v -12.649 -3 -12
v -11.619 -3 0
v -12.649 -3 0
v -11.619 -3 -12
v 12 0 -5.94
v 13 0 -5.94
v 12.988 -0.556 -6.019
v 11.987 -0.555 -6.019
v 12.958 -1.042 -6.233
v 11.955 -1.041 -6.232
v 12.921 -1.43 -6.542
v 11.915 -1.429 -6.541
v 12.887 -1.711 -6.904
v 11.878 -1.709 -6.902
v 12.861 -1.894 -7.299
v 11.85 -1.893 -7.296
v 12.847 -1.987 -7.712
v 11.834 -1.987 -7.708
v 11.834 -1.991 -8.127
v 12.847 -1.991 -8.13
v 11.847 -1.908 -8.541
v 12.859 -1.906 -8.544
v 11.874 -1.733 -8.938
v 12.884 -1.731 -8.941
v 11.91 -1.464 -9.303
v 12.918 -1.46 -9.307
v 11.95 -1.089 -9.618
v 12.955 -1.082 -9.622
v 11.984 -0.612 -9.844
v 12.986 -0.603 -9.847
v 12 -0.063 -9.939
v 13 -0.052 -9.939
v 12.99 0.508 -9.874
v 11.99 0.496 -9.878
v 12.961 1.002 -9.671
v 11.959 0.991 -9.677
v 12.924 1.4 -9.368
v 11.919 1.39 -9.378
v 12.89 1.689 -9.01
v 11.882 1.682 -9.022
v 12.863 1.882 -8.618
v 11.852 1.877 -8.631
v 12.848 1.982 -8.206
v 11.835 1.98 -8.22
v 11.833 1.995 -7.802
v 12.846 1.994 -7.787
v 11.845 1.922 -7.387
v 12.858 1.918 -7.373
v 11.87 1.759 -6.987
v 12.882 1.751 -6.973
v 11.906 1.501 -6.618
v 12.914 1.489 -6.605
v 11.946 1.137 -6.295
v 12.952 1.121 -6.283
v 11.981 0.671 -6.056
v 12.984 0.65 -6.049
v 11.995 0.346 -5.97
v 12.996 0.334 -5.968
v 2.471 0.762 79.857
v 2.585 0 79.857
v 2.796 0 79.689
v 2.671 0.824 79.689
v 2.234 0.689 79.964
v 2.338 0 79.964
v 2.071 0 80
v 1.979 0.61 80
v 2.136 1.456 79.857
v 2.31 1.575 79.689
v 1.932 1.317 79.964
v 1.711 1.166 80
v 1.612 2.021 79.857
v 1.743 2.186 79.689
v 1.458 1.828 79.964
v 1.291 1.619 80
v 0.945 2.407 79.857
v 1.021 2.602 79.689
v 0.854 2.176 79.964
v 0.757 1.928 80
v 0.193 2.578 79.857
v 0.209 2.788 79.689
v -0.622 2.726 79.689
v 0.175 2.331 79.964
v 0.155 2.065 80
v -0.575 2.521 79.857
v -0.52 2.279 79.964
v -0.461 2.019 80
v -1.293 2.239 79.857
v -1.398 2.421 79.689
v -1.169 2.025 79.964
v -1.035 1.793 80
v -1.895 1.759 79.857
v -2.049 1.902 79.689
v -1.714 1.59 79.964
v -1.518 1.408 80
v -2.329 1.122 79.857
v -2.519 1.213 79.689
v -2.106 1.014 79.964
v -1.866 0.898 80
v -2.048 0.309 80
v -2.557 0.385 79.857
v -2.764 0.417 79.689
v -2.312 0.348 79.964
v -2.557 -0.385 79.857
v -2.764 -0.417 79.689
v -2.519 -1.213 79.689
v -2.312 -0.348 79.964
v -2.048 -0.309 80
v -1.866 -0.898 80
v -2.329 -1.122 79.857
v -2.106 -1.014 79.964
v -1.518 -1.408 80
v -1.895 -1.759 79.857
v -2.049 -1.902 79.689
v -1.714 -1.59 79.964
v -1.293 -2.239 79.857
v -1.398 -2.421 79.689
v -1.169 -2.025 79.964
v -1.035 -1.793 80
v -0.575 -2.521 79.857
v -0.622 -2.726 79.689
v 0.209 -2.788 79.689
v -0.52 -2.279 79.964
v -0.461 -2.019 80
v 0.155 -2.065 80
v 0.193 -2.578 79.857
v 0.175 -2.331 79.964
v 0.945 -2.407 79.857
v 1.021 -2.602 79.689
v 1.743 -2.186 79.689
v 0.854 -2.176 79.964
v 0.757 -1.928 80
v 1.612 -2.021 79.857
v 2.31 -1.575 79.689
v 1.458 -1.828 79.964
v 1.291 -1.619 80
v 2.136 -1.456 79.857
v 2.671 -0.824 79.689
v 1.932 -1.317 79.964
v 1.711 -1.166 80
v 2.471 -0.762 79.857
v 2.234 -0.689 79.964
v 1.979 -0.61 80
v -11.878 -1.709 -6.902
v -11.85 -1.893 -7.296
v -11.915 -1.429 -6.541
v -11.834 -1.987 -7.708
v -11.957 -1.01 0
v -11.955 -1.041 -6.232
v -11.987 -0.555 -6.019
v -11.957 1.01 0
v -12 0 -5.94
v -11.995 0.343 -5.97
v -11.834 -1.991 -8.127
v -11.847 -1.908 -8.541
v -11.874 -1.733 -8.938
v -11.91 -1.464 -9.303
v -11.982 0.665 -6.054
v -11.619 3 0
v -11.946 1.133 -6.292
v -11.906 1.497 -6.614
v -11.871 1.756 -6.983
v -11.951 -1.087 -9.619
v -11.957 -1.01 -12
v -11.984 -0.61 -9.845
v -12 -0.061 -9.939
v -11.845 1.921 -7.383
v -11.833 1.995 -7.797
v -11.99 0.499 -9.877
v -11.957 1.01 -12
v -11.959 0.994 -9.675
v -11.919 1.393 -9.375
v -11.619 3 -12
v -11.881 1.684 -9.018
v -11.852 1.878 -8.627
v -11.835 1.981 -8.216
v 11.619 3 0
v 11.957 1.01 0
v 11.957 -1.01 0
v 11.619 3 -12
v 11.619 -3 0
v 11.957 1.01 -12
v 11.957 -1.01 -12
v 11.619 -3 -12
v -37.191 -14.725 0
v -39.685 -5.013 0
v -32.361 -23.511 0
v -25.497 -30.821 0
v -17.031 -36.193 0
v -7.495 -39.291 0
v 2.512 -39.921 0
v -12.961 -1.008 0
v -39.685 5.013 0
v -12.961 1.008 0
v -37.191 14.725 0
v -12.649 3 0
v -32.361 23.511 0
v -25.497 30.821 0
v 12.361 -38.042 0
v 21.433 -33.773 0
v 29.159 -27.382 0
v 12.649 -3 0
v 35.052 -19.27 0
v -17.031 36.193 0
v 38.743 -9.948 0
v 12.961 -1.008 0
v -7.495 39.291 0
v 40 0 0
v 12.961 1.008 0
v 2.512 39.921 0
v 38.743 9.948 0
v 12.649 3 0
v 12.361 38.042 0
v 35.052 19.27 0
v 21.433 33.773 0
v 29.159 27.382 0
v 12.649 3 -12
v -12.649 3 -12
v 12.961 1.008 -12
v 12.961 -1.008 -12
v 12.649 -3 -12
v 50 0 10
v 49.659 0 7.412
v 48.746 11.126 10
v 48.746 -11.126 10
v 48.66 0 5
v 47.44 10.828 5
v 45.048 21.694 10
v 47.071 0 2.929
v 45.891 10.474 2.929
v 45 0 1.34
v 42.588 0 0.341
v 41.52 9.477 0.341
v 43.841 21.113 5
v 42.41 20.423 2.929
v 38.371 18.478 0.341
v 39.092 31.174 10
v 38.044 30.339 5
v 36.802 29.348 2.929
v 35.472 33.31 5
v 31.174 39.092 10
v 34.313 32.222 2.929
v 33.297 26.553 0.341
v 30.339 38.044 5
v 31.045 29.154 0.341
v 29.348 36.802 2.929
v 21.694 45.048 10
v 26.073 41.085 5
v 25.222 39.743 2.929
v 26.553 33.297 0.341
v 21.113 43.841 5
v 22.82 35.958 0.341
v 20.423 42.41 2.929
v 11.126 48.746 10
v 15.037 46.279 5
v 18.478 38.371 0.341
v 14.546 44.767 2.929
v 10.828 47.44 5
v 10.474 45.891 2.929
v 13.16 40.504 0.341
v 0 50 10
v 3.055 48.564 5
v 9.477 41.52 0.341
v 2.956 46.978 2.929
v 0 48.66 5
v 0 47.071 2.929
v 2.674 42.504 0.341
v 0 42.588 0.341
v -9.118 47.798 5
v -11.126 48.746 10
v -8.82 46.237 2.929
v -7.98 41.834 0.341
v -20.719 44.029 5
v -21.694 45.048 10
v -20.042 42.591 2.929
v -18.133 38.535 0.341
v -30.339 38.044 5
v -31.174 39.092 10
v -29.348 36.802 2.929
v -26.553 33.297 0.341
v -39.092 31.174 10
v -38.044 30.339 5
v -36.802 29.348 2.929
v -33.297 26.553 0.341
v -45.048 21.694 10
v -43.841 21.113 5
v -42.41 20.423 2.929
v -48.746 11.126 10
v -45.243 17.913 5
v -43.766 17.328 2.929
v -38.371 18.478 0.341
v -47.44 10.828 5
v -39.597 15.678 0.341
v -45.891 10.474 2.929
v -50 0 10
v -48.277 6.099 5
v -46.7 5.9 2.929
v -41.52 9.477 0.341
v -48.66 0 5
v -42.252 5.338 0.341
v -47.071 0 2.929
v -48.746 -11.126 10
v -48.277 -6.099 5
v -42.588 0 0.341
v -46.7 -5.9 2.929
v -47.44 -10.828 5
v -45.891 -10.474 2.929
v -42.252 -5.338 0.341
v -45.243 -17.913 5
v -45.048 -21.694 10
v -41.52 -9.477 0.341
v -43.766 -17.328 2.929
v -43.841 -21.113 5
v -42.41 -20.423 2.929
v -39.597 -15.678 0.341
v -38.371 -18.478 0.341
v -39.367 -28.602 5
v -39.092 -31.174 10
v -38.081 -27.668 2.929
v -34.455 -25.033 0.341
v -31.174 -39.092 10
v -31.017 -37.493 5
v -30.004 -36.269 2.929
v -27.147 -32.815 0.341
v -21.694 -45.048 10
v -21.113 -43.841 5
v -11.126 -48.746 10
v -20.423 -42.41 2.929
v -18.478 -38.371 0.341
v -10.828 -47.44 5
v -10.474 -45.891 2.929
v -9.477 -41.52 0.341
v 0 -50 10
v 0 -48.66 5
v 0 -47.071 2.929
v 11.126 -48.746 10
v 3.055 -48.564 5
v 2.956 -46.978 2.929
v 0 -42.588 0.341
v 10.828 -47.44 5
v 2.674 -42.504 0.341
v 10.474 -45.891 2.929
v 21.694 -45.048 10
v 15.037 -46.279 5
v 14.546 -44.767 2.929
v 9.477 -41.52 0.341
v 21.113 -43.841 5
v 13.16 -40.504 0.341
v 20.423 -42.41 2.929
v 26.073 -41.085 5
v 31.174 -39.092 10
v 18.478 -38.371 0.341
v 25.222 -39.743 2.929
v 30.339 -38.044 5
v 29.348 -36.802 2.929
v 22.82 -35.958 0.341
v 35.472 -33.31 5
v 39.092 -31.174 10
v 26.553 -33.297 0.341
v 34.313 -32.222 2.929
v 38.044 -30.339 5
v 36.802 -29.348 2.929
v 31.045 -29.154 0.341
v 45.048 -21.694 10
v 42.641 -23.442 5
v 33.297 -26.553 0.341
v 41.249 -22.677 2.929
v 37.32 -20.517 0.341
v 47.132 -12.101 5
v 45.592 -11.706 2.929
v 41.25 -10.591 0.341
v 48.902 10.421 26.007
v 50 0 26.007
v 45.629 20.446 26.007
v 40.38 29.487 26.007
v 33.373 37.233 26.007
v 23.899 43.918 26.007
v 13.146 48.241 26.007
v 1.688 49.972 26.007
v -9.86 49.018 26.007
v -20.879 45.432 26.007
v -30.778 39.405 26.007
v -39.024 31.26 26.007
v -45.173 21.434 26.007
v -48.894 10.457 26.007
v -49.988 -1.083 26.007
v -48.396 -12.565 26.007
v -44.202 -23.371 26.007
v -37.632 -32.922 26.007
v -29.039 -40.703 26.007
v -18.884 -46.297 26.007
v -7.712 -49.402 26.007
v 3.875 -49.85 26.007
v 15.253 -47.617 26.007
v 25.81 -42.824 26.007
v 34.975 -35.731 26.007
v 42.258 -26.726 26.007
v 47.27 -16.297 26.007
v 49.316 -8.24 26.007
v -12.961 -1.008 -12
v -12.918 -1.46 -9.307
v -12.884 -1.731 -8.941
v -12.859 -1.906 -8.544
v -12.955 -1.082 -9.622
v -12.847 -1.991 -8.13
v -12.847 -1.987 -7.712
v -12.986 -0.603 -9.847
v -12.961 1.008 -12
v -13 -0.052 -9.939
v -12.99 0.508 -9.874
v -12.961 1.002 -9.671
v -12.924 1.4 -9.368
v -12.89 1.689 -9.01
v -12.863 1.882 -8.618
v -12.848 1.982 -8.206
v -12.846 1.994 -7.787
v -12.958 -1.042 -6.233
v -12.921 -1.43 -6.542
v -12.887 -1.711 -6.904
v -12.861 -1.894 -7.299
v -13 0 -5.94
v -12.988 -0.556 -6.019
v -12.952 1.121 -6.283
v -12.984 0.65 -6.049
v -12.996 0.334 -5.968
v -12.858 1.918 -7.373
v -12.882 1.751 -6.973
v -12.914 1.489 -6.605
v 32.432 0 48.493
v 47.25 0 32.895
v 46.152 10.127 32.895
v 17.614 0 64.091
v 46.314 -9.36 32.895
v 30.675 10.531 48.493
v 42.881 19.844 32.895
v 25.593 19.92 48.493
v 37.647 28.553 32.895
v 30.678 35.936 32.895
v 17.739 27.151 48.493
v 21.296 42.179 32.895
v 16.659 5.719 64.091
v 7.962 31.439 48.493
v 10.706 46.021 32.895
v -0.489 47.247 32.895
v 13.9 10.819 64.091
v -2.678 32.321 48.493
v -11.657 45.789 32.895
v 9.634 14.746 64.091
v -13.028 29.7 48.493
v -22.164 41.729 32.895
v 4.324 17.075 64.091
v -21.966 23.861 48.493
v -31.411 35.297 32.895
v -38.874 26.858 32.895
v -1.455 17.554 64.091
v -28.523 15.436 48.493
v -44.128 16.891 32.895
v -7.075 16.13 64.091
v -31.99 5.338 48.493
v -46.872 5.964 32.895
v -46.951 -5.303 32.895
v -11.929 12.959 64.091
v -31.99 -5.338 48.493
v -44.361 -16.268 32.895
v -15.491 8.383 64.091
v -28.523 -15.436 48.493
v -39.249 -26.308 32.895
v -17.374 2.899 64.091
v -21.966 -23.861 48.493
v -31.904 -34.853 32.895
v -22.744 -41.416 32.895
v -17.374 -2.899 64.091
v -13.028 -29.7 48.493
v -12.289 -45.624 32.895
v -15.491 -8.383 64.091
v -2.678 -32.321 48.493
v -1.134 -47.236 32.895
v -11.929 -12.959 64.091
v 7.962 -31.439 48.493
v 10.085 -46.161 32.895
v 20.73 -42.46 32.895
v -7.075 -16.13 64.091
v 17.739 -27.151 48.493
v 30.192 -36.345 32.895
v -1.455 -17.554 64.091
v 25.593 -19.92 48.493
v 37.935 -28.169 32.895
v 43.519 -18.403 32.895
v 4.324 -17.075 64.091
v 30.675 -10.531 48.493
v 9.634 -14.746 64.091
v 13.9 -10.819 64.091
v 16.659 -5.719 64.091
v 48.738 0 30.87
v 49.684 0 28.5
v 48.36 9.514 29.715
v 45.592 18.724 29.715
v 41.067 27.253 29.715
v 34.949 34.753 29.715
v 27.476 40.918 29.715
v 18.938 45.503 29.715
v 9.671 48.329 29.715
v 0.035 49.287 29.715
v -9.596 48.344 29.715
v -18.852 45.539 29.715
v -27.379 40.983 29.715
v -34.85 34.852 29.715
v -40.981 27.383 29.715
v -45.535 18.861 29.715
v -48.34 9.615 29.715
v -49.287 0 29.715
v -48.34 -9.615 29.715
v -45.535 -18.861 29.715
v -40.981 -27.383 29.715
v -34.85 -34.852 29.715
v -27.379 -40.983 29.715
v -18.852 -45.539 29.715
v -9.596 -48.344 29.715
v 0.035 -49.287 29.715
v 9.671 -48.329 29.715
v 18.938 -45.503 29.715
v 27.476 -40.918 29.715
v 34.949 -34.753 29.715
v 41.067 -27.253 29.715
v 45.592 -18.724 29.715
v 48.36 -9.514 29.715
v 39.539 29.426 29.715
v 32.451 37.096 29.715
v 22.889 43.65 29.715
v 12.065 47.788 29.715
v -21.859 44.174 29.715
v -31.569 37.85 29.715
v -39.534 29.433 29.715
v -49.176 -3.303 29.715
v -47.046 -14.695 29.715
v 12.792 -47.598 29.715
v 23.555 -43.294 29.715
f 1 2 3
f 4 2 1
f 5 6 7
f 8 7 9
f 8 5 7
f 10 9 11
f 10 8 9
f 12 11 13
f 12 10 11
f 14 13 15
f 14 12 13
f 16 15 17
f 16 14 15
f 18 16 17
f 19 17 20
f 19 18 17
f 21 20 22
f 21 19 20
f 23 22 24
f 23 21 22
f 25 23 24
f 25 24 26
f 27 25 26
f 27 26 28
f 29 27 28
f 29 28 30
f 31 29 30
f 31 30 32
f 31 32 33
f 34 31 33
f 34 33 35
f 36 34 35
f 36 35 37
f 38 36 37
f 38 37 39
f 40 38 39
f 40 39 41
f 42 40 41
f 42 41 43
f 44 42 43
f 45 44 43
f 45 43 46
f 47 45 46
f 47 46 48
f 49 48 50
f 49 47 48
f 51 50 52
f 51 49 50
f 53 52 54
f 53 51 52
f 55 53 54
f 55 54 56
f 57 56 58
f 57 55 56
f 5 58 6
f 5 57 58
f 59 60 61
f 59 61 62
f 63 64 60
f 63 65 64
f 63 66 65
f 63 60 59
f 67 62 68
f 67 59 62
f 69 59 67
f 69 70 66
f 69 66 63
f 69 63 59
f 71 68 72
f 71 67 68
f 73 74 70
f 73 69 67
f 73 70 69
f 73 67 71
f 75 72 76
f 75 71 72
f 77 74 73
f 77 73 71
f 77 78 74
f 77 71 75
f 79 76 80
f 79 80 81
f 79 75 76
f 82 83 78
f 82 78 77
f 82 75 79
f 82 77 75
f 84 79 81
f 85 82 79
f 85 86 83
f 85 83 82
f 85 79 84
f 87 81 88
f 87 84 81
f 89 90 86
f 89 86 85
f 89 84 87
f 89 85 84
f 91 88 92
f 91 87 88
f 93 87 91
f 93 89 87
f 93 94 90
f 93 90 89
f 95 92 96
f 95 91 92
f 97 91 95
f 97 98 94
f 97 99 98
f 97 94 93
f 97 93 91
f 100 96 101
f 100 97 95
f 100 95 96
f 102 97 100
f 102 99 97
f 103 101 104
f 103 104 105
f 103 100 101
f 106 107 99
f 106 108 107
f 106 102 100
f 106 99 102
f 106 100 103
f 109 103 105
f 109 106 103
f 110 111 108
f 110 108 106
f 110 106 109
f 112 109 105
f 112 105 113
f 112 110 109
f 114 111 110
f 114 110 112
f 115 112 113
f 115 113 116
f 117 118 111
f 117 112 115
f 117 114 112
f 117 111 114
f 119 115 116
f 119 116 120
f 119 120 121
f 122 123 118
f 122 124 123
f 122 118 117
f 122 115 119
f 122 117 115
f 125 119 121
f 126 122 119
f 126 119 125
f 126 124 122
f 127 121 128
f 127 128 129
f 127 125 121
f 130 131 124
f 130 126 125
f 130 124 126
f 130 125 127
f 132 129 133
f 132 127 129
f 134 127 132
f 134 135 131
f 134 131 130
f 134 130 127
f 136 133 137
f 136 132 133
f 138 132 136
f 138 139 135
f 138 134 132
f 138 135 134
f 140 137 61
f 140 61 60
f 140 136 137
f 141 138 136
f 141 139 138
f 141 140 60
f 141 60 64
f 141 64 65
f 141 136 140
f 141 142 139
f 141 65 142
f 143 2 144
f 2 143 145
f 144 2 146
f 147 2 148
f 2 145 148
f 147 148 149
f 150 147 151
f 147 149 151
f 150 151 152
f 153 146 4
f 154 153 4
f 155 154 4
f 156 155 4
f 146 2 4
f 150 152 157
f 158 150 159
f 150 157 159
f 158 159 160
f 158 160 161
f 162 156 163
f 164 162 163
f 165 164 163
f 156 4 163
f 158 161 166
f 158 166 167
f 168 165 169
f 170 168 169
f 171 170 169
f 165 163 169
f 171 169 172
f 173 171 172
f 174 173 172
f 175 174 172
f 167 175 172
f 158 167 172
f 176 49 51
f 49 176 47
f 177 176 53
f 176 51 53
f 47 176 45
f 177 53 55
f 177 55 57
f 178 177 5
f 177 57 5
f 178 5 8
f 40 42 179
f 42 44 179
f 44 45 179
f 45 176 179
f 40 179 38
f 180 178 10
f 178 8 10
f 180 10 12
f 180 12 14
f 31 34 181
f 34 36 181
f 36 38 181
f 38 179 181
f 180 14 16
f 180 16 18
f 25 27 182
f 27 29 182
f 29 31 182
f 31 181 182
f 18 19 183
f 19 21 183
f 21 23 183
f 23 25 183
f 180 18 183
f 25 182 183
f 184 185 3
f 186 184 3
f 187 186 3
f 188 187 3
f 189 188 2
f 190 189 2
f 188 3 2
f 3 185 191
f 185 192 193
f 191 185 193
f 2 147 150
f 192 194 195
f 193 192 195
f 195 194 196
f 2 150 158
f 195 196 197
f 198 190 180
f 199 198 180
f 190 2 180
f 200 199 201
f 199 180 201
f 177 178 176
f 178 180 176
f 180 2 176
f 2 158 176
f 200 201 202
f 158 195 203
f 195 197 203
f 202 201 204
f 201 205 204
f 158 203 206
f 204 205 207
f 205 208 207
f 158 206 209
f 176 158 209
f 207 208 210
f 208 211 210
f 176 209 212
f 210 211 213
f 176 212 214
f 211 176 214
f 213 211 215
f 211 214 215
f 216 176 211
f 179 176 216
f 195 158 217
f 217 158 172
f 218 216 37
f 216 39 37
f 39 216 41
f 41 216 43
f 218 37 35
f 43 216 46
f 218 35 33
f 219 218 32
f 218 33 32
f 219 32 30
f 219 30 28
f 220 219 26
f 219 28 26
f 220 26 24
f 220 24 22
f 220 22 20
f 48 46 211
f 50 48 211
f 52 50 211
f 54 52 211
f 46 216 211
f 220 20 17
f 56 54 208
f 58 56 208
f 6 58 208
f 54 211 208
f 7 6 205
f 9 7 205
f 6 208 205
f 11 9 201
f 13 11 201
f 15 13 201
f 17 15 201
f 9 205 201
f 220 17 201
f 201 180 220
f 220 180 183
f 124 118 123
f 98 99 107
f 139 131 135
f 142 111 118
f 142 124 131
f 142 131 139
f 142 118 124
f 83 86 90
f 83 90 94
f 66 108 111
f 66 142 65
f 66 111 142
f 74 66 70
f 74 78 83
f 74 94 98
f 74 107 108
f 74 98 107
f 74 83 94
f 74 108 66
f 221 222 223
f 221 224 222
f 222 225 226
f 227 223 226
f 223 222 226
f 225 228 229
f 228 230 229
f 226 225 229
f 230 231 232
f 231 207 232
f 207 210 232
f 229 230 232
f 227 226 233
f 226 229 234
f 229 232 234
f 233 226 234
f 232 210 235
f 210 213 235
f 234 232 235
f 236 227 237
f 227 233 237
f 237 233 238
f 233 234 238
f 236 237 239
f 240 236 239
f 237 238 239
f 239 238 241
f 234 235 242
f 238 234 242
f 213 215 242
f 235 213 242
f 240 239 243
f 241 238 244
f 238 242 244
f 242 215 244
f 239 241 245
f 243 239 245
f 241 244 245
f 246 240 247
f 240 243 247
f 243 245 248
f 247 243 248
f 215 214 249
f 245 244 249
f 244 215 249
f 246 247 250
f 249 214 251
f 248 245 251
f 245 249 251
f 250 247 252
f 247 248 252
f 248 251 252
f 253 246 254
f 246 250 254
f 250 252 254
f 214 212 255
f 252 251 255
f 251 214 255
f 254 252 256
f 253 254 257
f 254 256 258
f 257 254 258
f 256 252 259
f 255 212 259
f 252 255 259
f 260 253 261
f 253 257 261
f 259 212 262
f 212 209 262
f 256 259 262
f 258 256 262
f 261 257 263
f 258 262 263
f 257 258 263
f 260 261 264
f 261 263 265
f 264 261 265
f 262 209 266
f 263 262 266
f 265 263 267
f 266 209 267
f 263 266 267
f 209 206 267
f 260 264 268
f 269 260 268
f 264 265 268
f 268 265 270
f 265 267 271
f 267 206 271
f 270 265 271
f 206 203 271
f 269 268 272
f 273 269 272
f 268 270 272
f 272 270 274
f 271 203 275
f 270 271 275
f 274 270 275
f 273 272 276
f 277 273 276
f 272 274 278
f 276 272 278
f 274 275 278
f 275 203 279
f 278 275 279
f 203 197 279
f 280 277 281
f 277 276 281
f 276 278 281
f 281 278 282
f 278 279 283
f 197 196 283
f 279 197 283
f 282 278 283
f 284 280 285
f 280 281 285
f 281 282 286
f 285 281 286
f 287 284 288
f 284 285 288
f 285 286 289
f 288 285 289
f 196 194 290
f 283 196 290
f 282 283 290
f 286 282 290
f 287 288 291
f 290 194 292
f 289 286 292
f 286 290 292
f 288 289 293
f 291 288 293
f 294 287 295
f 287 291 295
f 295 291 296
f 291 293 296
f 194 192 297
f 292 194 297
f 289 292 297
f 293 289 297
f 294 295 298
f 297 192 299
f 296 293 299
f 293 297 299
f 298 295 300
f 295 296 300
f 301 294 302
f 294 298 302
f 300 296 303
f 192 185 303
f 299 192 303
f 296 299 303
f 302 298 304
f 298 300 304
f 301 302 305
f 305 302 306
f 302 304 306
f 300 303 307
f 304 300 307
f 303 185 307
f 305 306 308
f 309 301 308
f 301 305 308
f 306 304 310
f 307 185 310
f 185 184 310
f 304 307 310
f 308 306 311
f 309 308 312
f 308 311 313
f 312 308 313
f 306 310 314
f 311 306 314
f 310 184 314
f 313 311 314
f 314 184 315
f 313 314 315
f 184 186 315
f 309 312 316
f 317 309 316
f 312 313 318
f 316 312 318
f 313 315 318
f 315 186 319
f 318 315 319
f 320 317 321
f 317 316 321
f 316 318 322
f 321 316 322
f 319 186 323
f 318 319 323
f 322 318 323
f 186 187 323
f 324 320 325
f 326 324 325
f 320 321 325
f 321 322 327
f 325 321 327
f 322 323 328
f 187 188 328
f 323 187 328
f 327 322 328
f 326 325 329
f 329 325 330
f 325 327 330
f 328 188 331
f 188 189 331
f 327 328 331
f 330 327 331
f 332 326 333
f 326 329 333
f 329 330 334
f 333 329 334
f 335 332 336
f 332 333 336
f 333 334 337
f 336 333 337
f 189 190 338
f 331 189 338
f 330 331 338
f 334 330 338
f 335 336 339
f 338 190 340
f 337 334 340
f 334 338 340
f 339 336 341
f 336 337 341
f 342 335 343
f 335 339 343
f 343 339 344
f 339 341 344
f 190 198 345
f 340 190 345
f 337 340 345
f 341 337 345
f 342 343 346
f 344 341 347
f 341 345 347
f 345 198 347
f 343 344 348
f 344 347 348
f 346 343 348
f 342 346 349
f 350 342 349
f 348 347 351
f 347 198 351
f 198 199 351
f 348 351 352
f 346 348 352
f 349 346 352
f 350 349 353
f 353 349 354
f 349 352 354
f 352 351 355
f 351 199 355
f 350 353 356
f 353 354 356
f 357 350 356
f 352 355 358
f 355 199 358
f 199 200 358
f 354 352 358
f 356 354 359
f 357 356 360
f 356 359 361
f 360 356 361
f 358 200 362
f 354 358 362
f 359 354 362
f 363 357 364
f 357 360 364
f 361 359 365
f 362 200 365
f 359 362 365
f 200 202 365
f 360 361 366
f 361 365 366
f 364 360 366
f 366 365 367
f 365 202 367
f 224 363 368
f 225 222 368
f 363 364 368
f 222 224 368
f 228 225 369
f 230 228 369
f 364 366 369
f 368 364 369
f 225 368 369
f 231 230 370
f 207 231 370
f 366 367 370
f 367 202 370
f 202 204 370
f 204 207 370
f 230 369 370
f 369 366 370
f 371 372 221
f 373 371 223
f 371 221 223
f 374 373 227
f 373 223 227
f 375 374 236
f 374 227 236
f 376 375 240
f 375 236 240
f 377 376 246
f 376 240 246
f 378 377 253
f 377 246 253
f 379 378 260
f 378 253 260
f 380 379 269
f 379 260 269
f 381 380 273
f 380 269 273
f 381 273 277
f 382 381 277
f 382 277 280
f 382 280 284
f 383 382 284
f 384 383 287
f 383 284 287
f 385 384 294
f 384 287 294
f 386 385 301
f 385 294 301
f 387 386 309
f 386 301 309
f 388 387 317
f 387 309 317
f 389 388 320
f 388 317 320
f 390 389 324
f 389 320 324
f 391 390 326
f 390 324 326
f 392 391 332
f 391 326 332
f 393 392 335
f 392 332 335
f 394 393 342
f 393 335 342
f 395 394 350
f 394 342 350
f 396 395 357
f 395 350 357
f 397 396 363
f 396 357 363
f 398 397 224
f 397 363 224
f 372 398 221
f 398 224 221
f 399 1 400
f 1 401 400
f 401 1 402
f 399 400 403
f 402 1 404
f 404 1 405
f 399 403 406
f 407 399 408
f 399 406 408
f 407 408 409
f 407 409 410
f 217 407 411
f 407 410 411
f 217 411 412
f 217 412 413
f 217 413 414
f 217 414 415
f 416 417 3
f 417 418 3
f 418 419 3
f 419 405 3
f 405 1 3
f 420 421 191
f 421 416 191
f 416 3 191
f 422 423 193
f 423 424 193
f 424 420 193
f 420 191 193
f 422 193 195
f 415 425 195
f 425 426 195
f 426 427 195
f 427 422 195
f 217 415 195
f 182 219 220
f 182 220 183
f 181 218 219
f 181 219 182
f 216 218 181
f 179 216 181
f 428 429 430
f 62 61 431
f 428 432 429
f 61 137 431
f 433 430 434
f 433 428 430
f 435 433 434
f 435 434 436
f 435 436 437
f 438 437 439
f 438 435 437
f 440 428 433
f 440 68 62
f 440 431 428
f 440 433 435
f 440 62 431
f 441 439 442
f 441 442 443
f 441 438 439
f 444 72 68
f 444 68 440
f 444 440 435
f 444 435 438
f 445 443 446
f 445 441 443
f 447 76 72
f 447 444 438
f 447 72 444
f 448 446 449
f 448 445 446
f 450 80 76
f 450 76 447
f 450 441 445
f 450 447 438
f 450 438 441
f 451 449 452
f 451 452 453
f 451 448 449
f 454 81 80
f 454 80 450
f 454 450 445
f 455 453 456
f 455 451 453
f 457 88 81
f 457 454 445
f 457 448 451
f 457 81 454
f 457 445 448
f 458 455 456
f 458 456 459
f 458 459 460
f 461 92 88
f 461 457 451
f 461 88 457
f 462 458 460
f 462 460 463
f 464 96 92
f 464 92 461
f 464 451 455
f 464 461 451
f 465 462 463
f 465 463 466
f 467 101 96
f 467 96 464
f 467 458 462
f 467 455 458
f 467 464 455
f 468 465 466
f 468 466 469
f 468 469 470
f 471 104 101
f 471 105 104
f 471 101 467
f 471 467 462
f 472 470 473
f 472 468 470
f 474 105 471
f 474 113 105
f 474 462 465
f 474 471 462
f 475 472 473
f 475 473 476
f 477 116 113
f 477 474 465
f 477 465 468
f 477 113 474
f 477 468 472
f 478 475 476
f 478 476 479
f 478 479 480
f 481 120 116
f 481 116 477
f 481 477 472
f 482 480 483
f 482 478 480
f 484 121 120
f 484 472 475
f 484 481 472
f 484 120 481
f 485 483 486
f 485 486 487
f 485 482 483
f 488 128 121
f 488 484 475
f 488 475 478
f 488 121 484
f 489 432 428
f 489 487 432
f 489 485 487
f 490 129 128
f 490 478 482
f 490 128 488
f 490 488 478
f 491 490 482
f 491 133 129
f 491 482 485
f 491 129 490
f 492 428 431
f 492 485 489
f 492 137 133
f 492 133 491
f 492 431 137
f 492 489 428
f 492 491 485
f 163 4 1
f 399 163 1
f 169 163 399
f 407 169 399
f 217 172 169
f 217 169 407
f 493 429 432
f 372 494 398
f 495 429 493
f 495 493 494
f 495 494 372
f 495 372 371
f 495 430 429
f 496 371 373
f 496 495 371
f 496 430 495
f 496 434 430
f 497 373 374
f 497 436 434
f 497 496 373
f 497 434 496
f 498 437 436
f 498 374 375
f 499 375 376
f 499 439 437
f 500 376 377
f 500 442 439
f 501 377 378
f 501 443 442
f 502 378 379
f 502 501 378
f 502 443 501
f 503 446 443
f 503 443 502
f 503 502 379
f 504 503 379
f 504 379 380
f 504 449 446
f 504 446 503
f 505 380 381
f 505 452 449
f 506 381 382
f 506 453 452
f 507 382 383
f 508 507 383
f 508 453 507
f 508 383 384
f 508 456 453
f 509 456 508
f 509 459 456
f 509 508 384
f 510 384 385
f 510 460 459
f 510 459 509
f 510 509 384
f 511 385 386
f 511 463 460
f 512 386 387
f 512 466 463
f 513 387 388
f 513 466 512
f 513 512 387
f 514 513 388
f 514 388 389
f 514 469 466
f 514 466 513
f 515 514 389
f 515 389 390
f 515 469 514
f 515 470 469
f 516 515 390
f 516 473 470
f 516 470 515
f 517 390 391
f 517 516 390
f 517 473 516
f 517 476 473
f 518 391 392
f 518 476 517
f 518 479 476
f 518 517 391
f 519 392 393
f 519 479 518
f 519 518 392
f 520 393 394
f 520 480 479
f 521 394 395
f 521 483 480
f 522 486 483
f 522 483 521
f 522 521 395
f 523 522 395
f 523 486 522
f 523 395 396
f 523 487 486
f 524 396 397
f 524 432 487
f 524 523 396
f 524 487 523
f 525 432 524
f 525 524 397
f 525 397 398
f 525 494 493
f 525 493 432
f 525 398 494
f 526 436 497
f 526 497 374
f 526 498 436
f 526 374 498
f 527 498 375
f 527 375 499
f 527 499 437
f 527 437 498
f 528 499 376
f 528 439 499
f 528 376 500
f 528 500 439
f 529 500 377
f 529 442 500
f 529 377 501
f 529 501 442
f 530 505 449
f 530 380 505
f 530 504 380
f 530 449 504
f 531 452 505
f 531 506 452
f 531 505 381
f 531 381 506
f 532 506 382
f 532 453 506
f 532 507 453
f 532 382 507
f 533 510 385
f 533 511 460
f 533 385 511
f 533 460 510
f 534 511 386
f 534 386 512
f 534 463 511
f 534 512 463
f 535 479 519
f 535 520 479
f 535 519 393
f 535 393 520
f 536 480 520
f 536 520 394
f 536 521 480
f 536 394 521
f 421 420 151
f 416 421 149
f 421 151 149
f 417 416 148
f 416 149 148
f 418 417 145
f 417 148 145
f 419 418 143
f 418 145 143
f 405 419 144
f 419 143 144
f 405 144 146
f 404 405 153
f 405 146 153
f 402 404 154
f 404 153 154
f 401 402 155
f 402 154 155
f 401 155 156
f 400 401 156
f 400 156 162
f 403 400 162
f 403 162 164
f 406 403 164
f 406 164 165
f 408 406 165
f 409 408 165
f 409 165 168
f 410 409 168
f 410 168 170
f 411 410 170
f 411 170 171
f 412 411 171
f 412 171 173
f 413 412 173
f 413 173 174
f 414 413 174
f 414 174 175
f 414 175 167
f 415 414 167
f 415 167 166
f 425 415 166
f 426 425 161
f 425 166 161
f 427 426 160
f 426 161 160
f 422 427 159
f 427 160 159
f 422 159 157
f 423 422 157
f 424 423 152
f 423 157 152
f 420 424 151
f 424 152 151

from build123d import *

# Parameters (mm, degrees)
SKETCH2_R               = 50
BOSS_EXTRUDE1_DEPTH     = 30
SKETCH4_R               = 2.5
FILLET1_R               = 10
FILLET3_R               = 1
SKETCH6_R               = 13
BOSS_EXTRUDE2_DEPTH     = 12
SKETCH7_R               = 12
CUT_EXTRUDE1_DEPTH      = 12
SKETCH8_R               = 2
CUT_EXTRUDE2_DEPTH      = 20
CUT_EXTRUDE2_DEPTH_BACK = 19
SKETCH9_W               = 12
SKETCH9_H               = 10
CUT_EXTRUDE3_DEPTH      = 17
CUT_EXTRUDE3_DEPTH_BACK = 23
FILLET4_R               = 10


with BuildPart() as part:
    # Sketch2 → Boss-Extrude1 (new body)
    with BuildSketch(Plane.XY):
        Circle(SKETCH2_R)
    extrude(amount=BOSS_EXTRUDE1_DEPTH)

    # Sketch4 → section 1 of loft2
    with BuildSketch(Plane.XY.offset(80), mode=Mode.PRIVATE) as loft2_s1:
        Circle(SKETCH4_R)
    # loft up to a face of the part (loft2)
    loft([Face(Wire([part.edges().sort_by_distance((-34.227355296, 36.448431371, 30))[0]])), loft2_s1.sketch])

    # Fillet1
    fillet1_edges = [part.edges().sort_by_distance(p)[0] for p in [
        (-50, 0, 30),
    ]]
    fillet(fillet1_edges, radius=FILLET1_R)

    # Fillet3
    fillet3_edges = [part.edges().sort_by_distance(p)[0] for p in [
        (-2.5, 0, 80),
    ]]
    fillet(fillet3_edges, radius=FILLET3_R)

    # Sketch6 → Boss-Extrude2 (add)
    with BuildSketch(Plane(origin=(0, 0, 0), x_dir=(-1, 0, 0), z_dir=(0, 0, -1))):
        Circle(SKETCH6_R)
    extrude(amount=BOSS_EXTRUDE2_DEPTH)

    # Sketch7 → Cut-Extrude1 (cut)
    with BuildSketch(Plane(origin=(0, 0, -12), x_dir=(-1, 0, 0), z_dir=(0, 0, -1))):
        Circle(SKETCH7_R)
    extrude(amount=-CUT_EXTRUDE1_DEPTH, mode=Mode.SUBTRACT)

    # Sketch8 → Cut-Extrude2 (cut, two sides)
    with BuildSketch(Plane(origin=(0, 0, 0), x_dir=(0, 0, -1), z_dir=(1, 0, 0))) as cut_extrude2_sk:
        with Locations(Location((7.94, 0, 0), (0, 0, 180))):
            Circle(SKETCH8_R)
    extrude(amount=CUT_EXTRUDE2_DEPTH, mode=Mode.SUBTRACT)
    extrude(cut_extrude2_sk.sketch, amount=-CUT_EXTRUDE2_DEPTH_BACK, mode=Mode.SUBTRACT)

    # Sketch9 → Cut-Extrude3 (cut, two sides)
    with BuildSketch(Plane(origin=(0, 0, 0), x_dir=(0, 0, -1), z_dir=(1, 0, 0))) as cut_extrude3_sk:
        with Locations((6, 8)):
            Rectangle(SKETCH9_W, SKETCH9_H)
        with Locations((6, -8)):
            Rectangle(SKETCH9_W, SKETCH9_H)
    extrude(amount=CUT_EXTRUDE3_DEPTH, mode=Mode.SUBTRACT)
    extrude(cut_extrude3_sk.sketch, amount=-CUT_EXTRUDE3_DEPTH_BACK, mode=Mode.SUBTRACT)

    # Fillet4
    fillet4_edges = [part.edges().sort_by_distance(p)[0] for p in [
        (-50, 0, 0),
    ]]
    fillet(fillet4_edges, radius=FILLET4_R)


solid = part.part
